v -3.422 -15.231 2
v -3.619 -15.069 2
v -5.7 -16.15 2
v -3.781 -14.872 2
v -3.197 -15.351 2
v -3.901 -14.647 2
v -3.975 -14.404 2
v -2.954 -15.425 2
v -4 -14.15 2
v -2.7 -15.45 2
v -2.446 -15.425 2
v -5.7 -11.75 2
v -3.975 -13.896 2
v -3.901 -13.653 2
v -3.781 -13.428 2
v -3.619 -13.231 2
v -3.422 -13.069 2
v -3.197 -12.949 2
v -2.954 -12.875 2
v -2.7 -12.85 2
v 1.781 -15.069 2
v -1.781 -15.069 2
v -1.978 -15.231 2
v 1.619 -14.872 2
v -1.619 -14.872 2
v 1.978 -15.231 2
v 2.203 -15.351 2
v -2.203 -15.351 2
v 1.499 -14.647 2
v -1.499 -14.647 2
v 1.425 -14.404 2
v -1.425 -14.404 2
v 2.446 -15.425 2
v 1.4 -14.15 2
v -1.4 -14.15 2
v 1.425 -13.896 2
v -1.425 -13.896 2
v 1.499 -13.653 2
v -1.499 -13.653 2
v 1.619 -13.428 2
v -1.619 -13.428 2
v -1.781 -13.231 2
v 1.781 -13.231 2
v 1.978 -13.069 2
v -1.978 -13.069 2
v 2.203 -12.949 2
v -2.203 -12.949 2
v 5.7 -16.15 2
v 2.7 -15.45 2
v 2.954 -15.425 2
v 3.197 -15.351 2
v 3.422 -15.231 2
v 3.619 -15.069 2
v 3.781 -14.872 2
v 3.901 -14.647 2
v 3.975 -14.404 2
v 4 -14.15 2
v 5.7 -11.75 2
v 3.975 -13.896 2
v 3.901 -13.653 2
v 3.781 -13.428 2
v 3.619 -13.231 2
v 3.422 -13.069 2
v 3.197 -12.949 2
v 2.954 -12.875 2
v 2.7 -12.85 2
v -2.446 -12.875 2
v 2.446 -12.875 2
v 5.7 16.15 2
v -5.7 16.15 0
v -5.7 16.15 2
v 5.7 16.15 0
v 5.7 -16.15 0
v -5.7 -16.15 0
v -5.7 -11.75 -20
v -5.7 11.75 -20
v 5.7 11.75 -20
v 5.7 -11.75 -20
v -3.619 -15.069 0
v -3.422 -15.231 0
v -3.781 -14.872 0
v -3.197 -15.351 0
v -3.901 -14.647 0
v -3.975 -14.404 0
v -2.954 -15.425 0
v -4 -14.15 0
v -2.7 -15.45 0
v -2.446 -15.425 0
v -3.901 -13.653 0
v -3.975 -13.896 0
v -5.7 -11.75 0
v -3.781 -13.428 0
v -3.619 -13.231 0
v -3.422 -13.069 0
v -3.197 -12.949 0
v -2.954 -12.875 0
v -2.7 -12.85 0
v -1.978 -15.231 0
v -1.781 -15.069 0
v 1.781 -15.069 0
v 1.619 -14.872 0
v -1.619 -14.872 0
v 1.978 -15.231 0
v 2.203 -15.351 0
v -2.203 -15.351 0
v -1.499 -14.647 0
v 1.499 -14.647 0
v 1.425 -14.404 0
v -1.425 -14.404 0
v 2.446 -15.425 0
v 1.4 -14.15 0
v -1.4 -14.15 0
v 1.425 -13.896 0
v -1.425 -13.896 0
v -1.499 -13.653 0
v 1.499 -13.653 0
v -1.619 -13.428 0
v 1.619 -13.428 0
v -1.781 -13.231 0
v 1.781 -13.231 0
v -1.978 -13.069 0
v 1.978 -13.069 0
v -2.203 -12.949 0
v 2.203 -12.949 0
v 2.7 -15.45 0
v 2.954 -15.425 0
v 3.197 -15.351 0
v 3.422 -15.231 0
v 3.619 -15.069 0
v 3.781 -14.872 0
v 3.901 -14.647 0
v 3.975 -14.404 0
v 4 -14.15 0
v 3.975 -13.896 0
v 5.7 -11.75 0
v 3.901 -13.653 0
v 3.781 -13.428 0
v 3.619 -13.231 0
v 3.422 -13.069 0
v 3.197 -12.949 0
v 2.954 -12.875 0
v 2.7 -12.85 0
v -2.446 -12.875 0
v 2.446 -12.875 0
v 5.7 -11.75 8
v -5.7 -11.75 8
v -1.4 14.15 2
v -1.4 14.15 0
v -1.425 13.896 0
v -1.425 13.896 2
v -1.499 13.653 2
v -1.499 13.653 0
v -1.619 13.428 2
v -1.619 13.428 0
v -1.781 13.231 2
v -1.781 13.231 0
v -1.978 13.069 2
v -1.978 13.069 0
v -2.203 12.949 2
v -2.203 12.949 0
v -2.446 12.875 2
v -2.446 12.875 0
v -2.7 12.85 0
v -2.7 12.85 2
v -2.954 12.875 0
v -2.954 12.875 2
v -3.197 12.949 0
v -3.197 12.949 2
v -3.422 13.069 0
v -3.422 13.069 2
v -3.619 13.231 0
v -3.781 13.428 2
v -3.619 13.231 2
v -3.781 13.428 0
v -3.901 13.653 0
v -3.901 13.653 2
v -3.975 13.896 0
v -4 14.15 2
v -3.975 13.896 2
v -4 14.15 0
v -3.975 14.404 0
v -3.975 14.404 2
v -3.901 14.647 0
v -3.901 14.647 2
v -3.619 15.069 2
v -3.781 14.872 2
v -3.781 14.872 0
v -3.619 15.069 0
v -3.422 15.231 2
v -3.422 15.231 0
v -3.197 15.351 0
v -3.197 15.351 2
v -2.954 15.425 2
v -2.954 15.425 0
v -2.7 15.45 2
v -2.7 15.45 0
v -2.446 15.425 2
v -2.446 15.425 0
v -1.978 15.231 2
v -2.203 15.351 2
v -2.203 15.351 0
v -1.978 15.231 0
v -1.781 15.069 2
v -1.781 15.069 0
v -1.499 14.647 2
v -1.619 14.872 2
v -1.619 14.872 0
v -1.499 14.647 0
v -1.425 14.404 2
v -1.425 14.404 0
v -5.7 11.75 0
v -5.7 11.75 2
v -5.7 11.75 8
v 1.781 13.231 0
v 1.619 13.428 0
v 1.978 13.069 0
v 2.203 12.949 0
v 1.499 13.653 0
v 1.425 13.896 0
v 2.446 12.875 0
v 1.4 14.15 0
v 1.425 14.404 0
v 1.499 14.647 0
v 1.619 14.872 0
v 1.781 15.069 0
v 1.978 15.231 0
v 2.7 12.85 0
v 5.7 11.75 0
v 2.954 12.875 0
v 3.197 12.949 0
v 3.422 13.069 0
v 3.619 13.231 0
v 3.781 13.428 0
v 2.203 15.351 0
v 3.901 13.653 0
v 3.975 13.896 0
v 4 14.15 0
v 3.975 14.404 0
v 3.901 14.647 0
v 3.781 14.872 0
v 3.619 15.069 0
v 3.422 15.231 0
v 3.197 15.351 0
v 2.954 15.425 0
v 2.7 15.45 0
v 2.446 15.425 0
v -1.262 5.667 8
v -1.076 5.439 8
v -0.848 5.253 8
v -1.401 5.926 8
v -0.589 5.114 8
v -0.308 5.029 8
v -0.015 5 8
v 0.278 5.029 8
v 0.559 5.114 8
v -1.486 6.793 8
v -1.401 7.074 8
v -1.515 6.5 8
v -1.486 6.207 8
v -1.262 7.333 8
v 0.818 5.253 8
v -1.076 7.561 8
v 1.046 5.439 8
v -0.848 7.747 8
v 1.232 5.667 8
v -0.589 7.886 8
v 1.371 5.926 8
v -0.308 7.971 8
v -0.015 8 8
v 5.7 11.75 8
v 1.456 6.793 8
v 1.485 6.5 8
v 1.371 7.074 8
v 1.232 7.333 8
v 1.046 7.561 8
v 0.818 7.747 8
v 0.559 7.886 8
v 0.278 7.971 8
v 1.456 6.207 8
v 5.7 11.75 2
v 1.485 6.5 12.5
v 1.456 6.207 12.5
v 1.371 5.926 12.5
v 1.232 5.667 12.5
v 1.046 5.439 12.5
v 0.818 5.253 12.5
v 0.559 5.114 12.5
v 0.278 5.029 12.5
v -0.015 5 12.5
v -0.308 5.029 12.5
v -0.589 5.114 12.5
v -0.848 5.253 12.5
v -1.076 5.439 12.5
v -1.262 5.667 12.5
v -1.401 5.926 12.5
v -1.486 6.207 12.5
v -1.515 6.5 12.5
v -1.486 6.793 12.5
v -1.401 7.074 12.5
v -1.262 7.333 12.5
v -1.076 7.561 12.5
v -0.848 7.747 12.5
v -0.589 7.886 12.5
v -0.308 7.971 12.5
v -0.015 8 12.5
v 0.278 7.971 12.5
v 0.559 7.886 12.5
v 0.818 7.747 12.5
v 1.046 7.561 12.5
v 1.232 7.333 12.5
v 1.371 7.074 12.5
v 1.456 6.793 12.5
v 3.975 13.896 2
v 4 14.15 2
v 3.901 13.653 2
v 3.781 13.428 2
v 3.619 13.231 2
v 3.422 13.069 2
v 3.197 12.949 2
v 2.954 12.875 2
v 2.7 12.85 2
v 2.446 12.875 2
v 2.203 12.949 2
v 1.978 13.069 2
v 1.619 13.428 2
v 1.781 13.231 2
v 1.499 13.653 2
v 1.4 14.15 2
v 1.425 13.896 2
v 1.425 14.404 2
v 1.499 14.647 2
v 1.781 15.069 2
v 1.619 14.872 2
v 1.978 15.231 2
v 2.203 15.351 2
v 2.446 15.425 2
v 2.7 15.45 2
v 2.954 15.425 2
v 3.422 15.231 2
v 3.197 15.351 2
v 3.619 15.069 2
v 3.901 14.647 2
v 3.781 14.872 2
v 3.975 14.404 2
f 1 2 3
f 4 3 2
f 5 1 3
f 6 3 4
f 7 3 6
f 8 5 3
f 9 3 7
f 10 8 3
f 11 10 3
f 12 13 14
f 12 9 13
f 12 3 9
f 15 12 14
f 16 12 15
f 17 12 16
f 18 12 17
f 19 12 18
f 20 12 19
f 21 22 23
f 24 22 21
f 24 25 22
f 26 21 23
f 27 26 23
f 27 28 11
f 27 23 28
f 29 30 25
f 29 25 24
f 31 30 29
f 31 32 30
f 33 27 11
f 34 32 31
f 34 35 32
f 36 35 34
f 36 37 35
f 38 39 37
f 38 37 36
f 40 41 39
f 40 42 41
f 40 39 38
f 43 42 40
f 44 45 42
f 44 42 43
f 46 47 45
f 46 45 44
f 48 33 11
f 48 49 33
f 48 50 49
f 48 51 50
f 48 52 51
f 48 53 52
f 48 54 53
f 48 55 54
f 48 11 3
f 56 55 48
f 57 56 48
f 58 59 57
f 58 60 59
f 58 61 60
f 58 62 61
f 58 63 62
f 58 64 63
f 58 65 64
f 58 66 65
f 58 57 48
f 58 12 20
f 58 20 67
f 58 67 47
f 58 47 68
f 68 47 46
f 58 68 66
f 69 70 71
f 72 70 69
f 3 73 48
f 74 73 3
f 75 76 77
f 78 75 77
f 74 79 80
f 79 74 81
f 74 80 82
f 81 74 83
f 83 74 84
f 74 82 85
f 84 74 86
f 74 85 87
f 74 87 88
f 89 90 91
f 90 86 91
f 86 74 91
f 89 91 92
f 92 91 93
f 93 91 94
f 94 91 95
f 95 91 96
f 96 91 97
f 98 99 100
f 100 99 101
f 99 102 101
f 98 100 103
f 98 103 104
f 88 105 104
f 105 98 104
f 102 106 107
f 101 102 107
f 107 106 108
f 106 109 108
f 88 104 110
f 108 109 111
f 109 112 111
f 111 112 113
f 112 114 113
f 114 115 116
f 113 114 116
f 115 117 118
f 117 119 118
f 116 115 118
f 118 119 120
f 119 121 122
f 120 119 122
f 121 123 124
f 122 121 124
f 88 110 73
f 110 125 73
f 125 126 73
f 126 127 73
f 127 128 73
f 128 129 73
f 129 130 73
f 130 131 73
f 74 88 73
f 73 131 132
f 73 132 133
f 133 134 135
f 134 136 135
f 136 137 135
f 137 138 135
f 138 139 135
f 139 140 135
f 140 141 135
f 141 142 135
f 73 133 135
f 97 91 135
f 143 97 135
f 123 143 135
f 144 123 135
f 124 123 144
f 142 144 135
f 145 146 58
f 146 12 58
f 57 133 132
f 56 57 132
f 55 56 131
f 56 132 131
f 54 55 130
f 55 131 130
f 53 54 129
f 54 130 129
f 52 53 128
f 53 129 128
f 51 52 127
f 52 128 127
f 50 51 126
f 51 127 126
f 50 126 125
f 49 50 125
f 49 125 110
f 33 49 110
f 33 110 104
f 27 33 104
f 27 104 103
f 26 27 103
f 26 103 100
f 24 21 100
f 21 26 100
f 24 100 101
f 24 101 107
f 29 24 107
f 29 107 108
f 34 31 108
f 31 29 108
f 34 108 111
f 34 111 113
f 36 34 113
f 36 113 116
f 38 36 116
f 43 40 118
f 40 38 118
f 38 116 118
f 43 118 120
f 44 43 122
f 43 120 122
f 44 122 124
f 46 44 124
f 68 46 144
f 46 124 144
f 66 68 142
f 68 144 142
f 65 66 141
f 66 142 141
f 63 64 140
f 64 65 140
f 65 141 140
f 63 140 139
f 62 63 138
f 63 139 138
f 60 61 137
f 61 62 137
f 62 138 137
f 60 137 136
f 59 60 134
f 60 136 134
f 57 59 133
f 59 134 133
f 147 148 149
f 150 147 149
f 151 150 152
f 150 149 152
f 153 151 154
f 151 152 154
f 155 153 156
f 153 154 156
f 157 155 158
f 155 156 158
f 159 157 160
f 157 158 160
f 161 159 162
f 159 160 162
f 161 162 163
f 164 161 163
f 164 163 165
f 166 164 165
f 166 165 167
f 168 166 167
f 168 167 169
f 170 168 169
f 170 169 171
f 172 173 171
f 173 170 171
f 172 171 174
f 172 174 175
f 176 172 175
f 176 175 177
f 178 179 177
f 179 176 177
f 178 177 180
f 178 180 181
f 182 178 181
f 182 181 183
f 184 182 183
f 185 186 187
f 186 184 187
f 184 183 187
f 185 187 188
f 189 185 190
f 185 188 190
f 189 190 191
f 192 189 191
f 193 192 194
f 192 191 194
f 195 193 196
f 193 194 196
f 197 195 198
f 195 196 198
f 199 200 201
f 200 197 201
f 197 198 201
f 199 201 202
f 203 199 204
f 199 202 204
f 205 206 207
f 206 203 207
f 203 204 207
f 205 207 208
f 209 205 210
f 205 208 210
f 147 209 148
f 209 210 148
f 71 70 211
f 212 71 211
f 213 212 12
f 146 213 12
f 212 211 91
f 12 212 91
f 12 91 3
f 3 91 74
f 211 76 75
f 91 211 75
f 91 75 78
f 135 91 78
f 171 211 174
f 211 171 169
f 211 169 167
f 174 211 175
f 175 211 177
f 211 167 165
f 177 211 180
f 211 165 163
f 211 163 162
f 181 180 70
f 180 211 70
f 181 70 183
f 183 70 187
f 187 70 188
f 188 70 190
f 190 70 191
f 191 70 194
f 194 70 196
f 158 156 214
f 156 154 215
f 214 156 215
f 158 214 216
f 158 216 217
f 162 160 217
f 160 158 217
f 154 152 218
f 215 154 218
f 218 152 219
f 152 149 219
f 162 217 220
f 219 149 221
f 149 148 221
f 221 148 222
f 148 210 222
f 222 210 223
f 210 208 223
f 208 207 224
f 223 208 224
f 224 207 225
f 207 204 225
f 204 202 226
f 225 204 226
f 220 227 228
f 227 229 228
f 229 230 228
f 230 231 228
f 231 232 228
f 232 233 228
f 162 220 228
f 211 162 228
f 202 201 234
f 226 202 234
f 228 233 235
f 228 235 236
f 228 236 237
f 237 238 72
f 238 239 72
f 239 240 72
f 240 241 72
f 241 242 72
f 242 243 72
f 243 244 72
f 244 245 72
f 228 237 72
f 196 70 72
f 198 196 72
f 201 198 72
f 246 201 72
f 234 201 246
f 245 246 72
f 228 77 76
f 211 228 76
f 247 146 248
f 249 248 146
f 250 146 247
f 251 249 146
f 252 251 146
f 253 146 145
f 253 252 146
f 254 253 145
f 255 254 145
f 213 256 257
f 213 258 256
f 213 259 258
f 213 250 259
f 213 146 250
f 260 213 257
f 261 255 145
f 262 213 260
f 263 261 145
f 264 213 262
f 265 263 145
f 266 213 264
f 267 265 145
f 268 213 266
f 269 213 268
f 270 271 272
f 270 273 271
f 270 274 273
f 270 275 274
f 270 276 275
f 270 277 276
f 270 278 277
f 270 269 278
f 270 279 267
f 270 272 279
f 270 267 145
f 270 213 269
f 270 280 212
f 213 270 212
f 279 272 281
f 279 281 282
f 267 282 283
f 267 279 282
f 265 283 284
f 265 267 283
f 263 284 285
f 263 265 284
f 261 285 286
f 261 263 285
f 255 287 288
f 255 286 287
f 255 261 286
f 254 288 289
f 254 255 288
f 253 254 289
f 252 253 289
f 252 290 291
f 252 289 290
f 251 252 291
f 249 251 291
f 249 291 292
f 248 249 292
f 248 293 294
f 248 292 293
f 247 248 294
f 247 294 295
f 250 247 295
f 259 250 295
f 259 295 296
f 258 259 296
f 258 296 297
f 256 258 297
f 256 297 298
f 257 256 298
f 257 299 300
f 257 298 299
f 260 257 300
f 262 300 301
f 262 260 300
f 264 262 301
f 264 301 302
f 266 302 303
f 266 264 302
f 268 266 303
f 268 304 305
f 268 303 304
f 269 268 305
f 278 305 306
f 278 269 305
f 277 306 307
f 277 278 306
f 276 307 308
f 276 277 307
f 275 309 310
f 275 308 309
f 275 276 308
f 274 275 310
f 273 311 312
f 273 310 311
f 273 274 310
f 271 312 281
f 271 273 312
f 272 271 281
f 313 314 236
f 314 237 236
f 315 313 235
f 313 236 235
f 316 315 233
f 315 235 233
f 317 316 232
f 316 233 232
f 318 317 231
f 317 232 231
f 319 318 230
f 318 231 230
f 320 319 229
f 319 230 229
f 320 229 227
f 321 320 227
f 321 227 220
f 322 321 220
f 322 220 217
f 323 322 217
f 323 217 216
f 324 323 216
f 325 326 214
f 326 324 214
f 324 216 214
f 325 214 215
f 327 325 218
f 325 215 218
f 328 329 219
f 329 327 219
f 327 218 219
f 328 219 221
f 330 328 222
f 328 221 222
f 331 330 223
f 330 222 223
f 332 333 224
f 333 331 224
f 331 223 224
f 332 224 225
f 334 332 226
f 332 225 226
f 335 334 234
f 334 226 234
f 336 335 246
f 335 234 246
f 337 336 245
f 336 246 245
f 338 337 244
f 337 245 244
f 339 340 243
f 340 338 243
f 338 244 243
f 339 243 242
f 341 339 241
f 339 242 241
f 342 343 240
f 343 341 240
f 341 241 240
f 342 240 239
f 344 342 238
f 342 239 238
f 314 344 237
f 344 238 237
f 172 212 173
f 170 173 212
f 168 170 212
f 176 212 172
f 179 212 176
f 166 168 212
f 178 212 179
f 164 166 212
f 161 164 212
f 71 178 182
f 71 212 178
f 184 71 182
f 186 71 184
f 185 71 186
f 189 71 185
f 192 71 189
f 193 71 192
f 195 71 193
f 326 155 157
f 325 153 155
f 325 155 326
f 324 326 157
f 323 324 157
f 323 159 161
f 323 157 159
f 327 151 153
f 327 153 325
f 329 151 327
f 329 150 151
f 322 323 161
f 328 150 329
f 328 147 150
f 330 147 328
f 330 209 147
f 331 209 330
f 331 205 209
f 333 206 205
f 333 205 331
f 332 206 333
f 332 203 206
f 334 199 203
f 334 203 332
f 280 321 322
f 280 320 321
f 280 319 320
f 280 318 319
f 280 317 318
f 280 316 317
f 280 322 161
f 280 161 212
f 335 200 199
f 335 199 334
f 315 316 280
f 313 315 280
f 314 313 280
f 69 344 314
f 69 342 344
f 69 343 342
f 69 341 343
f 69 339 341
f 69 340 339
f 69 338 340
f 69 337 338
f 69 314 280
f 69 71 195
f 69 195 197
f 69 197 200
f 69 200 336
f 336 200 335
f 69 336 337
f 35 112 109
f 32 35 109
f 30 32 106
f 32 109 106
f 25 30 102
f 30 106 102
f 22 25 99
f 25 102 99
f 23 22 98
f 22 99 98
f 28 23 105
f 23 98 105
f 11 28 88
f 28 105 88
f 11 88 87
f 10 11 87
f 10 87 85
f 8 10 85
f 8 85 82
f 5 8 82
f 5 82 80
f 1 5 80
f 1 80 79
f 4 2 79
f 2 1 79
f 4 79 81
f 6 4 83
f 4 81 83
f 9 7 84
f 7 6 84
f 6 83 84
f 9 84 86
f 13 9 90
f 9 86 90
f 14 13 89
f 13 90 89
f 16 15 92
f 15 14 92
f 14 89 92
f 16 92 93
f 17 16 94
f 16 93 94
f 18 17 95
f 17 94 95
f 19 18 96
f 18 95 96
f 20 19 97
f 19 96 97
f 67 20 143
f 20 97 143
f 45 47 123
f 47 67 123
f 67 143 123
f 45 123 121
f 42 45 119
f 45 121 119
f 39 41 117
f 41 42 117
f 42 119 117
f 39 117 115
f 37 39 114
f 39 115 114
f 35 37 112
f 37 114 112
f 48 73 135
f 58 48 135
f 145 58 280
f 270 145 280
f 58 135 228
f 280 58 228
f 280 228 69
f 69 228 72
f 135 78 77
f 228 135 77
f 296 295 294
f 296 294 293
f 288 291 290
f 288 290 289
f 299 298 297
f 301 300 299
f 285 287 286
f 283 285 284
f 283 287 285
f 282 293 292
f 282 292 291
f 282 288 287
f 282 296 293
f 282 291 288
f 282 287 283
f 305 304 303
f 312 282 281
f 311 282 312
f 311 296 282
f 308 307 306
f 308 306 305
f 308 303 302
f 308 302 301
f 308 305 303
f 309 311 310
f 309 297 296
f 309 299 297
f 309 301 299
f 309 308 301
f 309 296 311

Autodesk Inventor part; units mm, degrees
ref_plane "YZ Plane" through (0, 0, 0) normal (1, 0, 0) x (0, 1, 0)
ref_plane "XZ Plane" through (0, 0, 0) normal (0, 1, 0) x (-1, 0, 0)
ref_plane "XY Plane" through (0, 0, 0) normal (0, 0, 1) x (1, 0, 0)
sketch "Sketch1" plane through (0, 0, 0) normal (0, 0, 1) x (1, 0, 0)
  line L0 (-5.7, -11.75) -> (5.7, -11.75)
  line L1 (5.7, -11.75) -> (5.7, 11.75)
  line L2 (5.7, 11.75) -> (-5.7, 11.75)
  line L3 (-5.7, 11.75) -> (-5.7, -11.75)
  line L4 (-5.7, -11.75) -> (5.7, 11.75) construction
  line L5 (5.7, -11.75) -> (-5.7, 11.75) construction
  line L6 (5.7, 11.75) -> (-5.7, 11.75)
  line L7 (-5.7, 11.75) -> (-5.7, 16.15)
  line L8 (-5.7, 16.15) -> (5.7, 16.15)
  line L9 (5.7, 16.15) -> (5.7, 11.75)
  circle A0 centre (-2.7, 14.15) radius 1.3
  circle A1 centre (2.7, 14.15) radius 1.3
  circle A2 centre (-2.7, -14.15) radius 1.3
  circle A3 centre (2.7, -14.15) radius 1.3
  line L10 (-5.7, -11.75) -> (5.7, -11.75)
  line L11 (5.7, -11.75) -> (5.7, -16.15)
  line L12 (5.7, -16.15) -> (-5.7, -16.15)
  line L13 (-5.7, -16.15) -> (-5.7, -11.75)
  point P0 (0, 0)
  dimension "d0" = 11.4
  dimension "d1" = 23.5
  dimension "d2" = 4.4
  dimension "d3" = 2.6
  dimension "d4" = 3
  dimension "d5" = 2.4
  dimension "d6" = 4.4
  dimension "d7" = 3
  dimension "d8" = 3
  dimension "d9" = 3
  dimension "d10" = 2.4
  dimension "d11" = 2.4
  dimension "d18" = 2.4
extrude "Extrusion1" add sketch "Sketch1" along normal blind 8 and the other way blind 20 contours L3 L2 L1 L0
extrude "Extrusion2" add sketch "Sketch1" along normal blind 2 contours L7 L8 L9 L2
extrude "Extrusion3" add sketch "Sketch1" along normal blind 2 contours L0 L11 L12 L13
sketch "Sketch2" plane through (0, 0, 8) normal (0, 0, 1) x (1, 0, 0)
  line L0 (5.7, -11.75) -> (5.7, 11.75) projected
  circle A0 centre (-0.015, 6.5) radius 1.5
  point P0 (0, 0)
  dimension "d37" = 3
  dimension "d38" = 5.715
  dimension "d39" = 6.5
extrude "Extrusion4" add sketch "Sketch2" along normal blind 4.5
equation "\"d0\" = ServoCoreWidth"
equation "\"d1\" = ServoCoreLength"
equation "\"d2\" = ServoFixationLength"
equation "\"d4\" = ServoEdgeToFixation"
equation "\"d5\" = ServoCoreToFixation"
equation "\"d6\" = ServoFixationLength"
equation "\"d7\" = ServoEdgeToFixation"
equation "\"d8\" = ServoEdgeToFixation"
equation "\"d9\" = ServoEdgeToFixation"
equation "\"d10\" = ServoCoreToFixation"
equation "\"d11\" = ServoCoreToFixation"
equation "\"d18\" = ServoCoreToFixation"
equation "\"d39\" = ServoAxisToCenter"
equation "\"ServoCoreToFixation\" = 2.4"
equation "\"ServoEdgeToFixation\" = 3"
equation "\"ServoCoreWidth\" = 11.4"
equation "\"ServoSpacing\" = 0.2"
equation "\"ServoCoreLength\" = 23.5"
equation "\"ServoFixationLength\" = 4.4"
equation "\"ServoScrewDiameter\" = 2"
equation "\"ServoHeadScrewTrace\" = 4.5"
equation "\"ServoHeadScrewThickness\" = 2.5"
equation "\"ServoExtendedSpacing\" = 1"
equation "\"ServoAxisToCenter\" = 6.5"
properties part number "SimplifiedServo"
